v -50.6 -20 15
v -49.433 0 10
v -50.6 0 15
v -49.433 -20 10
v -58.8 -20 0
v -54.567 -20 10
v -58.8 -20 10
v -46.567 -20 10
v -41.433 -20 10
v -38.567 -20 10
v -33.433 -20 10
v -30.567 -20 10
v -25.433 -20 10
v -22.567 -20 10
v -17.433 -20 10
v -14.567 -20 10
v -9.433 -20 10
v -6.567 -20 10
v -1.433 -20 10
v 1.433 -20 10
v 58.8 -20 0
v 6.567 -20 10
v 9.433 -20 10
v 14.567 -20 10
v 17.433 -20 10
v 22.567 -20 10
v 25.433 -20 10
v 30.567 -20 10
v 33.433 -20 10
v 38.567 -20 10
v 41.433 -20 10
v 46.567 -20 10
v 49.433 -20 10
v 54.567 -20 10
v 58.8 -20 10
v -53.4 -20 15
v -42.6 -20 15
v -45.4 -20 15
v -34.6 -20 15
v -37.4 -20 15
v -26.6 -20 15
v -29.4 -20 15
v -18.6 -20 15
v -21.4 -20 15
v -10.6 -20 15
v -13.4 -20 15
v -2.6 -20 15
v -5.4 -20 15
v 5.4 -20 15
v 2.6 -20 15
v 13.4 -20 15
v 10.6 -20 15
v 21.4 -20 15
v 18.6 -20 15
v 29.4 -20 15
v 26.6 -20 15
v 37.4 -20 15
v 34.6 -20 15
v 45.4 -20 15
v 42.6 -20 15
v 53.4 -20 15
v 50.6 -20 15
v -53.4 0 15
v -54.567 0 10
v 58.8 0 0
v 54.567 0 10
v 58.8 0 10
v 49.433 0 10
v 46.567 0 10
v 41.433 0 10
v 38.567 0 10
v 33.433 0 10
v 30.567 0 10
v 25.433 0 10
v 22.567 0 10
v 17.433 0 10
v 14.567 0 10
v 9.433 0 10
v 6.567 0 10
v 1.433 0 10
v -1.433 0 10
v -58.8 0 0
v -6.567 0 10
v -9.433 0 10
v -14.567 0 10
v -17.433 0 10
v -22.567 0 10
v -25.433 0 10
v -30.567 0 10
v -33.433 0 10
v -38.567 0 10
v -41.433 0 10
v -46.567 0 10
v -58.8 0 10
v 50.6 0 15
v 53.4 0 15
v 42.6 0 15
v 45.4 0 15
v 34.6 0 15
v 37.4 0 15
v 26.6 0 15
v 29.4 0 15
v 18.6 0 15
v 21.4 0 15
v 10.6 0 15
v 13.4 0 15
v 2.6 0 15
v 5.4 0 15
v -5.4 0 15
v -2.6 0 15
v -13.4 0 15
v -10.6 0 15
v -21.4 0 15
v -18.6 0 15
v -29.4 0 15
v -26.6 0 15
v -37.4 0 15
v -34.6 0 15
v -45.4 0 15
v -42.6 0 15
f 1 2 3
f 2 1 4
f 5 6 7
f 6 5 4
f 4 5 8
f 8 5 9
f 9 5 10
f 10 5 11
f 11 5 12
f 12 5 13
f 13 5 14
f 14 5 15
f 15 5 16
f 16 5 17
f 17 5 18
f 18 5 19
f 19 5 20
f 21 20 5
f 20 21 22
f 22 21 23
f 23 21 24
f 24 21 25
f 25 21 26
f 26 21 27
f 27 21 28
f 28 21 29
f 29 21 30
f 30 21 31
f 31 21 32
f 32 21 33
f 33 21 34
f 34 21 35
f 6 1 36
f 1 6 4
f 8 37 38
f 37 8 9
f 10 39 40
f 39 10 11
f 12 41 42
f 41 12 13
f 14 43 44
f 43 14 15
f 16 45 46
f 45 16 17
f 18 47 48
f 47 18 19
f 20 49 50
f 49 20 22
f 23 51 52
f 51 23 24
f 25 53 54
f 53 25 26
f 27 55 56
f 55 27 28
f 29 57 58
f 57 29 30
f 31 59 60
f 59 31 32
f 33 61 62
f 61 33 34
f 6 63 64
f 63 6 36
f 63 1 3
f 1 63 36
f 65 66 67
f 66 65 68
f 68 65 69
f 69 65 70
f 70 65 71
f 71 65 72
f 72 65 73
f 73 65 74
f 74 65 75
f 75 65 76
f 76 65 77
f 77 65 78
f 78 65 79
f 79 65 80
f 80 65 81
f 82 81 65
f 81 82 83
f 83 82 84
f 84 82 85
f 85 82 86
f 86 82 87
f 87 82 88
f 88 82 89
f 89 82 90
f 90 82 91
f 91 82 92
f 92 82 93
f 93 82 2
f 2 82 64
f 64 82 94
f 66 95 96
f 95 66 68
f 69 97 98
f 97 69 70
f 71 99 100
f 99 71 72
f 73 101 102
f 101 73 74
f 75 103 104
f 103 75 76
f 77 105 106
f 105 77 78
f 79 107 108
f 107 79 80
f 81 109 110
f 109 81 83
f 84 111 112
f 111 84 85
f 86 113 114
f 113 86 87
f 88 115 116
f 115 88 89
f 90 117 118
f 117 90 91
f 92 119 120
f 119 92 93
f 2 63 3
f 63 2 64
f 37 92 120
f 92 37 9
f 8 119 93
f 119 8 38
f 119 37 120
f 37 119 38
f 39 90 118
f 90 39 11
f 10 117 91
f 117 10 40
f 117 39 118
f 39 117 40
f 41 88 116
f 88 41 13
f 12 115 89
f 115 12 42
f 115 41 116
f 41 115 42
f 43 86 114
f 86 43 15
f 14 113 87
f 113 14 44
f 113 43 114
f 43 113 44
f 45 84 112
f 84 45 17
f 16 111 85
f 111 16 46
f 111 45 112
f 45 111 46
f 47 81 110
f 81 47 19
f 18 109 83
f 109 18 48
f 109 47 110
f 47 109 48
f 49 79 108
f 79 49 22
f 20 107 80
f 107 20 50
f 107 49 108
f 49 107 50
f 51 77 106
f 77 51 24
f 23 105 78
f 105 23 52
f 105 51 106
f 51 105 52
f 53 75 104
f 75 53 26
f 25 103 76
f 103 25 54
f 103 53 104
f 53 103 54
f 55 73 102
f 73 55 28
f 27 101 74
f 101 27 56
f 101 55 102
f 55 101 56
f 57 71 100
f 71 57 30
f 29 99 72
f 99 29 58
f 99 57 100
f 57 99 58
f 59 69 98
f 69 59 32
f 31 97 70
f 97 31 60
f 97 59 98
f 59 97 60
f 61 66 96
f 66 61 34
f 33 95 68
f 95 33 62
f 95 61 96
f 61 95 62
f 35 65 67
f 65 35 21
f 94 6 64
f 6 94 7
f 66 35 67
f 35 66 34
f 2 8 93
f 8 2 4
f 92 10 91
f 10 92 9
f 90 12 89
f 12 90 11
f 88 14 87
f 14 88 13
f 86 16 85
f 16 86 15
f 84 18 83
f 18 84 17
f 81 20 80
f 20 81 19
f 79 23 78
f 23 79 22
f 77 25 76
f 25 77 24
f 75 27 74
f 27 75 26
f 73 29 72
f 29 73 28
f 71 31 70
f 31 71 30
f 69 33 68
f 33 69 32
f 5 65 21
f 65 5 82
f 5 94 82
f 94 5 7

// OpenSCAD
$fn = 32;

// ----------------------------------------------------------------------
// Toothed rack, 14 teeth
// 8 mm pitch, 5 mm teeth
// ----------------------------------------------------------------------

// --- parameters (mm) ---
bar_w = 20;     // bar width (Y)
bar_h = 10;     // bar height (Z)
teeth = 14;     // number of teeth
pitch = 8;      // tooth pitch
tooth_h = 5;    // tooth height above the bar
root_w = 5.6;   // tooth width at the root
crest_w = 2.8;  // tooth width at the crest

// --- derived feature positions (mm) ---
span = (teeth - 1) * pitch;  // = 104   distance between the outer teeth
bar_l = span + root_w + 8;   // = 117.6   bar length: teeth plus 4 mm at each end
tooth_x = -span / 2;         // = -52   X of the first tooth
height = bar_h + tooth_h;    // = 15   overall height
feature_centers = [
  [tooth_x + 0 * pitch, -bar_w / 2],
  [tooth_x + 1 * pitch, -bar_w / 2],
  [tooth_x + 2 * pitch, -bar_w / 2],
  [tooth_x + 3 * pitch, -bar_w / 2],
  [tooth_x + 4 * pitch, -bar_w / 2],
  [tooth_x + 5 * pitch, -bar_w / 2],
  [tooth_x + 6 * pitch, -bar_w / 2],
  [tooth_x + 7 * pitch, -bar_w / 2],
  [tooth_x + 8 * pitch, -bar_w / 2],
  [tooth_x + 9 * pitch, -bar_w / 2],
  [tooth_x + 10 * pitch, -bar_w / 2],
  [tooth_x + 11 * pitch, -bar_w / 2],
  [tooth_x + 12 * pitch, -bar_w / 2],
  [tooth_x + 13 * pitch, -bar_w / 2]
];   // tooth centre line, drives the tooth loop

// bar with a rack of teeth, one extruded trapezoium per centre
module rack_tooth() {
  linear_extrude(height = bar_w)
    polygon(points = [
      [0, 0],
      [root_w, 0],
      [root_w / 2 + crest_w / 2, tooth_h + 1],
      [root_w / 2 - crest_w / 2, tooth_h + 1]
    ]);
}

union() {
  translate([-bar_l / 2, -bar_w, 0]) cube([bar_l, bar_w, bar_h]);
  for (centre = feature_centers)
    translate([centre[0] - root_w / 2, 0, bar_h - 1]) rotate([90, 0, 0]) rack_tooth();
}
